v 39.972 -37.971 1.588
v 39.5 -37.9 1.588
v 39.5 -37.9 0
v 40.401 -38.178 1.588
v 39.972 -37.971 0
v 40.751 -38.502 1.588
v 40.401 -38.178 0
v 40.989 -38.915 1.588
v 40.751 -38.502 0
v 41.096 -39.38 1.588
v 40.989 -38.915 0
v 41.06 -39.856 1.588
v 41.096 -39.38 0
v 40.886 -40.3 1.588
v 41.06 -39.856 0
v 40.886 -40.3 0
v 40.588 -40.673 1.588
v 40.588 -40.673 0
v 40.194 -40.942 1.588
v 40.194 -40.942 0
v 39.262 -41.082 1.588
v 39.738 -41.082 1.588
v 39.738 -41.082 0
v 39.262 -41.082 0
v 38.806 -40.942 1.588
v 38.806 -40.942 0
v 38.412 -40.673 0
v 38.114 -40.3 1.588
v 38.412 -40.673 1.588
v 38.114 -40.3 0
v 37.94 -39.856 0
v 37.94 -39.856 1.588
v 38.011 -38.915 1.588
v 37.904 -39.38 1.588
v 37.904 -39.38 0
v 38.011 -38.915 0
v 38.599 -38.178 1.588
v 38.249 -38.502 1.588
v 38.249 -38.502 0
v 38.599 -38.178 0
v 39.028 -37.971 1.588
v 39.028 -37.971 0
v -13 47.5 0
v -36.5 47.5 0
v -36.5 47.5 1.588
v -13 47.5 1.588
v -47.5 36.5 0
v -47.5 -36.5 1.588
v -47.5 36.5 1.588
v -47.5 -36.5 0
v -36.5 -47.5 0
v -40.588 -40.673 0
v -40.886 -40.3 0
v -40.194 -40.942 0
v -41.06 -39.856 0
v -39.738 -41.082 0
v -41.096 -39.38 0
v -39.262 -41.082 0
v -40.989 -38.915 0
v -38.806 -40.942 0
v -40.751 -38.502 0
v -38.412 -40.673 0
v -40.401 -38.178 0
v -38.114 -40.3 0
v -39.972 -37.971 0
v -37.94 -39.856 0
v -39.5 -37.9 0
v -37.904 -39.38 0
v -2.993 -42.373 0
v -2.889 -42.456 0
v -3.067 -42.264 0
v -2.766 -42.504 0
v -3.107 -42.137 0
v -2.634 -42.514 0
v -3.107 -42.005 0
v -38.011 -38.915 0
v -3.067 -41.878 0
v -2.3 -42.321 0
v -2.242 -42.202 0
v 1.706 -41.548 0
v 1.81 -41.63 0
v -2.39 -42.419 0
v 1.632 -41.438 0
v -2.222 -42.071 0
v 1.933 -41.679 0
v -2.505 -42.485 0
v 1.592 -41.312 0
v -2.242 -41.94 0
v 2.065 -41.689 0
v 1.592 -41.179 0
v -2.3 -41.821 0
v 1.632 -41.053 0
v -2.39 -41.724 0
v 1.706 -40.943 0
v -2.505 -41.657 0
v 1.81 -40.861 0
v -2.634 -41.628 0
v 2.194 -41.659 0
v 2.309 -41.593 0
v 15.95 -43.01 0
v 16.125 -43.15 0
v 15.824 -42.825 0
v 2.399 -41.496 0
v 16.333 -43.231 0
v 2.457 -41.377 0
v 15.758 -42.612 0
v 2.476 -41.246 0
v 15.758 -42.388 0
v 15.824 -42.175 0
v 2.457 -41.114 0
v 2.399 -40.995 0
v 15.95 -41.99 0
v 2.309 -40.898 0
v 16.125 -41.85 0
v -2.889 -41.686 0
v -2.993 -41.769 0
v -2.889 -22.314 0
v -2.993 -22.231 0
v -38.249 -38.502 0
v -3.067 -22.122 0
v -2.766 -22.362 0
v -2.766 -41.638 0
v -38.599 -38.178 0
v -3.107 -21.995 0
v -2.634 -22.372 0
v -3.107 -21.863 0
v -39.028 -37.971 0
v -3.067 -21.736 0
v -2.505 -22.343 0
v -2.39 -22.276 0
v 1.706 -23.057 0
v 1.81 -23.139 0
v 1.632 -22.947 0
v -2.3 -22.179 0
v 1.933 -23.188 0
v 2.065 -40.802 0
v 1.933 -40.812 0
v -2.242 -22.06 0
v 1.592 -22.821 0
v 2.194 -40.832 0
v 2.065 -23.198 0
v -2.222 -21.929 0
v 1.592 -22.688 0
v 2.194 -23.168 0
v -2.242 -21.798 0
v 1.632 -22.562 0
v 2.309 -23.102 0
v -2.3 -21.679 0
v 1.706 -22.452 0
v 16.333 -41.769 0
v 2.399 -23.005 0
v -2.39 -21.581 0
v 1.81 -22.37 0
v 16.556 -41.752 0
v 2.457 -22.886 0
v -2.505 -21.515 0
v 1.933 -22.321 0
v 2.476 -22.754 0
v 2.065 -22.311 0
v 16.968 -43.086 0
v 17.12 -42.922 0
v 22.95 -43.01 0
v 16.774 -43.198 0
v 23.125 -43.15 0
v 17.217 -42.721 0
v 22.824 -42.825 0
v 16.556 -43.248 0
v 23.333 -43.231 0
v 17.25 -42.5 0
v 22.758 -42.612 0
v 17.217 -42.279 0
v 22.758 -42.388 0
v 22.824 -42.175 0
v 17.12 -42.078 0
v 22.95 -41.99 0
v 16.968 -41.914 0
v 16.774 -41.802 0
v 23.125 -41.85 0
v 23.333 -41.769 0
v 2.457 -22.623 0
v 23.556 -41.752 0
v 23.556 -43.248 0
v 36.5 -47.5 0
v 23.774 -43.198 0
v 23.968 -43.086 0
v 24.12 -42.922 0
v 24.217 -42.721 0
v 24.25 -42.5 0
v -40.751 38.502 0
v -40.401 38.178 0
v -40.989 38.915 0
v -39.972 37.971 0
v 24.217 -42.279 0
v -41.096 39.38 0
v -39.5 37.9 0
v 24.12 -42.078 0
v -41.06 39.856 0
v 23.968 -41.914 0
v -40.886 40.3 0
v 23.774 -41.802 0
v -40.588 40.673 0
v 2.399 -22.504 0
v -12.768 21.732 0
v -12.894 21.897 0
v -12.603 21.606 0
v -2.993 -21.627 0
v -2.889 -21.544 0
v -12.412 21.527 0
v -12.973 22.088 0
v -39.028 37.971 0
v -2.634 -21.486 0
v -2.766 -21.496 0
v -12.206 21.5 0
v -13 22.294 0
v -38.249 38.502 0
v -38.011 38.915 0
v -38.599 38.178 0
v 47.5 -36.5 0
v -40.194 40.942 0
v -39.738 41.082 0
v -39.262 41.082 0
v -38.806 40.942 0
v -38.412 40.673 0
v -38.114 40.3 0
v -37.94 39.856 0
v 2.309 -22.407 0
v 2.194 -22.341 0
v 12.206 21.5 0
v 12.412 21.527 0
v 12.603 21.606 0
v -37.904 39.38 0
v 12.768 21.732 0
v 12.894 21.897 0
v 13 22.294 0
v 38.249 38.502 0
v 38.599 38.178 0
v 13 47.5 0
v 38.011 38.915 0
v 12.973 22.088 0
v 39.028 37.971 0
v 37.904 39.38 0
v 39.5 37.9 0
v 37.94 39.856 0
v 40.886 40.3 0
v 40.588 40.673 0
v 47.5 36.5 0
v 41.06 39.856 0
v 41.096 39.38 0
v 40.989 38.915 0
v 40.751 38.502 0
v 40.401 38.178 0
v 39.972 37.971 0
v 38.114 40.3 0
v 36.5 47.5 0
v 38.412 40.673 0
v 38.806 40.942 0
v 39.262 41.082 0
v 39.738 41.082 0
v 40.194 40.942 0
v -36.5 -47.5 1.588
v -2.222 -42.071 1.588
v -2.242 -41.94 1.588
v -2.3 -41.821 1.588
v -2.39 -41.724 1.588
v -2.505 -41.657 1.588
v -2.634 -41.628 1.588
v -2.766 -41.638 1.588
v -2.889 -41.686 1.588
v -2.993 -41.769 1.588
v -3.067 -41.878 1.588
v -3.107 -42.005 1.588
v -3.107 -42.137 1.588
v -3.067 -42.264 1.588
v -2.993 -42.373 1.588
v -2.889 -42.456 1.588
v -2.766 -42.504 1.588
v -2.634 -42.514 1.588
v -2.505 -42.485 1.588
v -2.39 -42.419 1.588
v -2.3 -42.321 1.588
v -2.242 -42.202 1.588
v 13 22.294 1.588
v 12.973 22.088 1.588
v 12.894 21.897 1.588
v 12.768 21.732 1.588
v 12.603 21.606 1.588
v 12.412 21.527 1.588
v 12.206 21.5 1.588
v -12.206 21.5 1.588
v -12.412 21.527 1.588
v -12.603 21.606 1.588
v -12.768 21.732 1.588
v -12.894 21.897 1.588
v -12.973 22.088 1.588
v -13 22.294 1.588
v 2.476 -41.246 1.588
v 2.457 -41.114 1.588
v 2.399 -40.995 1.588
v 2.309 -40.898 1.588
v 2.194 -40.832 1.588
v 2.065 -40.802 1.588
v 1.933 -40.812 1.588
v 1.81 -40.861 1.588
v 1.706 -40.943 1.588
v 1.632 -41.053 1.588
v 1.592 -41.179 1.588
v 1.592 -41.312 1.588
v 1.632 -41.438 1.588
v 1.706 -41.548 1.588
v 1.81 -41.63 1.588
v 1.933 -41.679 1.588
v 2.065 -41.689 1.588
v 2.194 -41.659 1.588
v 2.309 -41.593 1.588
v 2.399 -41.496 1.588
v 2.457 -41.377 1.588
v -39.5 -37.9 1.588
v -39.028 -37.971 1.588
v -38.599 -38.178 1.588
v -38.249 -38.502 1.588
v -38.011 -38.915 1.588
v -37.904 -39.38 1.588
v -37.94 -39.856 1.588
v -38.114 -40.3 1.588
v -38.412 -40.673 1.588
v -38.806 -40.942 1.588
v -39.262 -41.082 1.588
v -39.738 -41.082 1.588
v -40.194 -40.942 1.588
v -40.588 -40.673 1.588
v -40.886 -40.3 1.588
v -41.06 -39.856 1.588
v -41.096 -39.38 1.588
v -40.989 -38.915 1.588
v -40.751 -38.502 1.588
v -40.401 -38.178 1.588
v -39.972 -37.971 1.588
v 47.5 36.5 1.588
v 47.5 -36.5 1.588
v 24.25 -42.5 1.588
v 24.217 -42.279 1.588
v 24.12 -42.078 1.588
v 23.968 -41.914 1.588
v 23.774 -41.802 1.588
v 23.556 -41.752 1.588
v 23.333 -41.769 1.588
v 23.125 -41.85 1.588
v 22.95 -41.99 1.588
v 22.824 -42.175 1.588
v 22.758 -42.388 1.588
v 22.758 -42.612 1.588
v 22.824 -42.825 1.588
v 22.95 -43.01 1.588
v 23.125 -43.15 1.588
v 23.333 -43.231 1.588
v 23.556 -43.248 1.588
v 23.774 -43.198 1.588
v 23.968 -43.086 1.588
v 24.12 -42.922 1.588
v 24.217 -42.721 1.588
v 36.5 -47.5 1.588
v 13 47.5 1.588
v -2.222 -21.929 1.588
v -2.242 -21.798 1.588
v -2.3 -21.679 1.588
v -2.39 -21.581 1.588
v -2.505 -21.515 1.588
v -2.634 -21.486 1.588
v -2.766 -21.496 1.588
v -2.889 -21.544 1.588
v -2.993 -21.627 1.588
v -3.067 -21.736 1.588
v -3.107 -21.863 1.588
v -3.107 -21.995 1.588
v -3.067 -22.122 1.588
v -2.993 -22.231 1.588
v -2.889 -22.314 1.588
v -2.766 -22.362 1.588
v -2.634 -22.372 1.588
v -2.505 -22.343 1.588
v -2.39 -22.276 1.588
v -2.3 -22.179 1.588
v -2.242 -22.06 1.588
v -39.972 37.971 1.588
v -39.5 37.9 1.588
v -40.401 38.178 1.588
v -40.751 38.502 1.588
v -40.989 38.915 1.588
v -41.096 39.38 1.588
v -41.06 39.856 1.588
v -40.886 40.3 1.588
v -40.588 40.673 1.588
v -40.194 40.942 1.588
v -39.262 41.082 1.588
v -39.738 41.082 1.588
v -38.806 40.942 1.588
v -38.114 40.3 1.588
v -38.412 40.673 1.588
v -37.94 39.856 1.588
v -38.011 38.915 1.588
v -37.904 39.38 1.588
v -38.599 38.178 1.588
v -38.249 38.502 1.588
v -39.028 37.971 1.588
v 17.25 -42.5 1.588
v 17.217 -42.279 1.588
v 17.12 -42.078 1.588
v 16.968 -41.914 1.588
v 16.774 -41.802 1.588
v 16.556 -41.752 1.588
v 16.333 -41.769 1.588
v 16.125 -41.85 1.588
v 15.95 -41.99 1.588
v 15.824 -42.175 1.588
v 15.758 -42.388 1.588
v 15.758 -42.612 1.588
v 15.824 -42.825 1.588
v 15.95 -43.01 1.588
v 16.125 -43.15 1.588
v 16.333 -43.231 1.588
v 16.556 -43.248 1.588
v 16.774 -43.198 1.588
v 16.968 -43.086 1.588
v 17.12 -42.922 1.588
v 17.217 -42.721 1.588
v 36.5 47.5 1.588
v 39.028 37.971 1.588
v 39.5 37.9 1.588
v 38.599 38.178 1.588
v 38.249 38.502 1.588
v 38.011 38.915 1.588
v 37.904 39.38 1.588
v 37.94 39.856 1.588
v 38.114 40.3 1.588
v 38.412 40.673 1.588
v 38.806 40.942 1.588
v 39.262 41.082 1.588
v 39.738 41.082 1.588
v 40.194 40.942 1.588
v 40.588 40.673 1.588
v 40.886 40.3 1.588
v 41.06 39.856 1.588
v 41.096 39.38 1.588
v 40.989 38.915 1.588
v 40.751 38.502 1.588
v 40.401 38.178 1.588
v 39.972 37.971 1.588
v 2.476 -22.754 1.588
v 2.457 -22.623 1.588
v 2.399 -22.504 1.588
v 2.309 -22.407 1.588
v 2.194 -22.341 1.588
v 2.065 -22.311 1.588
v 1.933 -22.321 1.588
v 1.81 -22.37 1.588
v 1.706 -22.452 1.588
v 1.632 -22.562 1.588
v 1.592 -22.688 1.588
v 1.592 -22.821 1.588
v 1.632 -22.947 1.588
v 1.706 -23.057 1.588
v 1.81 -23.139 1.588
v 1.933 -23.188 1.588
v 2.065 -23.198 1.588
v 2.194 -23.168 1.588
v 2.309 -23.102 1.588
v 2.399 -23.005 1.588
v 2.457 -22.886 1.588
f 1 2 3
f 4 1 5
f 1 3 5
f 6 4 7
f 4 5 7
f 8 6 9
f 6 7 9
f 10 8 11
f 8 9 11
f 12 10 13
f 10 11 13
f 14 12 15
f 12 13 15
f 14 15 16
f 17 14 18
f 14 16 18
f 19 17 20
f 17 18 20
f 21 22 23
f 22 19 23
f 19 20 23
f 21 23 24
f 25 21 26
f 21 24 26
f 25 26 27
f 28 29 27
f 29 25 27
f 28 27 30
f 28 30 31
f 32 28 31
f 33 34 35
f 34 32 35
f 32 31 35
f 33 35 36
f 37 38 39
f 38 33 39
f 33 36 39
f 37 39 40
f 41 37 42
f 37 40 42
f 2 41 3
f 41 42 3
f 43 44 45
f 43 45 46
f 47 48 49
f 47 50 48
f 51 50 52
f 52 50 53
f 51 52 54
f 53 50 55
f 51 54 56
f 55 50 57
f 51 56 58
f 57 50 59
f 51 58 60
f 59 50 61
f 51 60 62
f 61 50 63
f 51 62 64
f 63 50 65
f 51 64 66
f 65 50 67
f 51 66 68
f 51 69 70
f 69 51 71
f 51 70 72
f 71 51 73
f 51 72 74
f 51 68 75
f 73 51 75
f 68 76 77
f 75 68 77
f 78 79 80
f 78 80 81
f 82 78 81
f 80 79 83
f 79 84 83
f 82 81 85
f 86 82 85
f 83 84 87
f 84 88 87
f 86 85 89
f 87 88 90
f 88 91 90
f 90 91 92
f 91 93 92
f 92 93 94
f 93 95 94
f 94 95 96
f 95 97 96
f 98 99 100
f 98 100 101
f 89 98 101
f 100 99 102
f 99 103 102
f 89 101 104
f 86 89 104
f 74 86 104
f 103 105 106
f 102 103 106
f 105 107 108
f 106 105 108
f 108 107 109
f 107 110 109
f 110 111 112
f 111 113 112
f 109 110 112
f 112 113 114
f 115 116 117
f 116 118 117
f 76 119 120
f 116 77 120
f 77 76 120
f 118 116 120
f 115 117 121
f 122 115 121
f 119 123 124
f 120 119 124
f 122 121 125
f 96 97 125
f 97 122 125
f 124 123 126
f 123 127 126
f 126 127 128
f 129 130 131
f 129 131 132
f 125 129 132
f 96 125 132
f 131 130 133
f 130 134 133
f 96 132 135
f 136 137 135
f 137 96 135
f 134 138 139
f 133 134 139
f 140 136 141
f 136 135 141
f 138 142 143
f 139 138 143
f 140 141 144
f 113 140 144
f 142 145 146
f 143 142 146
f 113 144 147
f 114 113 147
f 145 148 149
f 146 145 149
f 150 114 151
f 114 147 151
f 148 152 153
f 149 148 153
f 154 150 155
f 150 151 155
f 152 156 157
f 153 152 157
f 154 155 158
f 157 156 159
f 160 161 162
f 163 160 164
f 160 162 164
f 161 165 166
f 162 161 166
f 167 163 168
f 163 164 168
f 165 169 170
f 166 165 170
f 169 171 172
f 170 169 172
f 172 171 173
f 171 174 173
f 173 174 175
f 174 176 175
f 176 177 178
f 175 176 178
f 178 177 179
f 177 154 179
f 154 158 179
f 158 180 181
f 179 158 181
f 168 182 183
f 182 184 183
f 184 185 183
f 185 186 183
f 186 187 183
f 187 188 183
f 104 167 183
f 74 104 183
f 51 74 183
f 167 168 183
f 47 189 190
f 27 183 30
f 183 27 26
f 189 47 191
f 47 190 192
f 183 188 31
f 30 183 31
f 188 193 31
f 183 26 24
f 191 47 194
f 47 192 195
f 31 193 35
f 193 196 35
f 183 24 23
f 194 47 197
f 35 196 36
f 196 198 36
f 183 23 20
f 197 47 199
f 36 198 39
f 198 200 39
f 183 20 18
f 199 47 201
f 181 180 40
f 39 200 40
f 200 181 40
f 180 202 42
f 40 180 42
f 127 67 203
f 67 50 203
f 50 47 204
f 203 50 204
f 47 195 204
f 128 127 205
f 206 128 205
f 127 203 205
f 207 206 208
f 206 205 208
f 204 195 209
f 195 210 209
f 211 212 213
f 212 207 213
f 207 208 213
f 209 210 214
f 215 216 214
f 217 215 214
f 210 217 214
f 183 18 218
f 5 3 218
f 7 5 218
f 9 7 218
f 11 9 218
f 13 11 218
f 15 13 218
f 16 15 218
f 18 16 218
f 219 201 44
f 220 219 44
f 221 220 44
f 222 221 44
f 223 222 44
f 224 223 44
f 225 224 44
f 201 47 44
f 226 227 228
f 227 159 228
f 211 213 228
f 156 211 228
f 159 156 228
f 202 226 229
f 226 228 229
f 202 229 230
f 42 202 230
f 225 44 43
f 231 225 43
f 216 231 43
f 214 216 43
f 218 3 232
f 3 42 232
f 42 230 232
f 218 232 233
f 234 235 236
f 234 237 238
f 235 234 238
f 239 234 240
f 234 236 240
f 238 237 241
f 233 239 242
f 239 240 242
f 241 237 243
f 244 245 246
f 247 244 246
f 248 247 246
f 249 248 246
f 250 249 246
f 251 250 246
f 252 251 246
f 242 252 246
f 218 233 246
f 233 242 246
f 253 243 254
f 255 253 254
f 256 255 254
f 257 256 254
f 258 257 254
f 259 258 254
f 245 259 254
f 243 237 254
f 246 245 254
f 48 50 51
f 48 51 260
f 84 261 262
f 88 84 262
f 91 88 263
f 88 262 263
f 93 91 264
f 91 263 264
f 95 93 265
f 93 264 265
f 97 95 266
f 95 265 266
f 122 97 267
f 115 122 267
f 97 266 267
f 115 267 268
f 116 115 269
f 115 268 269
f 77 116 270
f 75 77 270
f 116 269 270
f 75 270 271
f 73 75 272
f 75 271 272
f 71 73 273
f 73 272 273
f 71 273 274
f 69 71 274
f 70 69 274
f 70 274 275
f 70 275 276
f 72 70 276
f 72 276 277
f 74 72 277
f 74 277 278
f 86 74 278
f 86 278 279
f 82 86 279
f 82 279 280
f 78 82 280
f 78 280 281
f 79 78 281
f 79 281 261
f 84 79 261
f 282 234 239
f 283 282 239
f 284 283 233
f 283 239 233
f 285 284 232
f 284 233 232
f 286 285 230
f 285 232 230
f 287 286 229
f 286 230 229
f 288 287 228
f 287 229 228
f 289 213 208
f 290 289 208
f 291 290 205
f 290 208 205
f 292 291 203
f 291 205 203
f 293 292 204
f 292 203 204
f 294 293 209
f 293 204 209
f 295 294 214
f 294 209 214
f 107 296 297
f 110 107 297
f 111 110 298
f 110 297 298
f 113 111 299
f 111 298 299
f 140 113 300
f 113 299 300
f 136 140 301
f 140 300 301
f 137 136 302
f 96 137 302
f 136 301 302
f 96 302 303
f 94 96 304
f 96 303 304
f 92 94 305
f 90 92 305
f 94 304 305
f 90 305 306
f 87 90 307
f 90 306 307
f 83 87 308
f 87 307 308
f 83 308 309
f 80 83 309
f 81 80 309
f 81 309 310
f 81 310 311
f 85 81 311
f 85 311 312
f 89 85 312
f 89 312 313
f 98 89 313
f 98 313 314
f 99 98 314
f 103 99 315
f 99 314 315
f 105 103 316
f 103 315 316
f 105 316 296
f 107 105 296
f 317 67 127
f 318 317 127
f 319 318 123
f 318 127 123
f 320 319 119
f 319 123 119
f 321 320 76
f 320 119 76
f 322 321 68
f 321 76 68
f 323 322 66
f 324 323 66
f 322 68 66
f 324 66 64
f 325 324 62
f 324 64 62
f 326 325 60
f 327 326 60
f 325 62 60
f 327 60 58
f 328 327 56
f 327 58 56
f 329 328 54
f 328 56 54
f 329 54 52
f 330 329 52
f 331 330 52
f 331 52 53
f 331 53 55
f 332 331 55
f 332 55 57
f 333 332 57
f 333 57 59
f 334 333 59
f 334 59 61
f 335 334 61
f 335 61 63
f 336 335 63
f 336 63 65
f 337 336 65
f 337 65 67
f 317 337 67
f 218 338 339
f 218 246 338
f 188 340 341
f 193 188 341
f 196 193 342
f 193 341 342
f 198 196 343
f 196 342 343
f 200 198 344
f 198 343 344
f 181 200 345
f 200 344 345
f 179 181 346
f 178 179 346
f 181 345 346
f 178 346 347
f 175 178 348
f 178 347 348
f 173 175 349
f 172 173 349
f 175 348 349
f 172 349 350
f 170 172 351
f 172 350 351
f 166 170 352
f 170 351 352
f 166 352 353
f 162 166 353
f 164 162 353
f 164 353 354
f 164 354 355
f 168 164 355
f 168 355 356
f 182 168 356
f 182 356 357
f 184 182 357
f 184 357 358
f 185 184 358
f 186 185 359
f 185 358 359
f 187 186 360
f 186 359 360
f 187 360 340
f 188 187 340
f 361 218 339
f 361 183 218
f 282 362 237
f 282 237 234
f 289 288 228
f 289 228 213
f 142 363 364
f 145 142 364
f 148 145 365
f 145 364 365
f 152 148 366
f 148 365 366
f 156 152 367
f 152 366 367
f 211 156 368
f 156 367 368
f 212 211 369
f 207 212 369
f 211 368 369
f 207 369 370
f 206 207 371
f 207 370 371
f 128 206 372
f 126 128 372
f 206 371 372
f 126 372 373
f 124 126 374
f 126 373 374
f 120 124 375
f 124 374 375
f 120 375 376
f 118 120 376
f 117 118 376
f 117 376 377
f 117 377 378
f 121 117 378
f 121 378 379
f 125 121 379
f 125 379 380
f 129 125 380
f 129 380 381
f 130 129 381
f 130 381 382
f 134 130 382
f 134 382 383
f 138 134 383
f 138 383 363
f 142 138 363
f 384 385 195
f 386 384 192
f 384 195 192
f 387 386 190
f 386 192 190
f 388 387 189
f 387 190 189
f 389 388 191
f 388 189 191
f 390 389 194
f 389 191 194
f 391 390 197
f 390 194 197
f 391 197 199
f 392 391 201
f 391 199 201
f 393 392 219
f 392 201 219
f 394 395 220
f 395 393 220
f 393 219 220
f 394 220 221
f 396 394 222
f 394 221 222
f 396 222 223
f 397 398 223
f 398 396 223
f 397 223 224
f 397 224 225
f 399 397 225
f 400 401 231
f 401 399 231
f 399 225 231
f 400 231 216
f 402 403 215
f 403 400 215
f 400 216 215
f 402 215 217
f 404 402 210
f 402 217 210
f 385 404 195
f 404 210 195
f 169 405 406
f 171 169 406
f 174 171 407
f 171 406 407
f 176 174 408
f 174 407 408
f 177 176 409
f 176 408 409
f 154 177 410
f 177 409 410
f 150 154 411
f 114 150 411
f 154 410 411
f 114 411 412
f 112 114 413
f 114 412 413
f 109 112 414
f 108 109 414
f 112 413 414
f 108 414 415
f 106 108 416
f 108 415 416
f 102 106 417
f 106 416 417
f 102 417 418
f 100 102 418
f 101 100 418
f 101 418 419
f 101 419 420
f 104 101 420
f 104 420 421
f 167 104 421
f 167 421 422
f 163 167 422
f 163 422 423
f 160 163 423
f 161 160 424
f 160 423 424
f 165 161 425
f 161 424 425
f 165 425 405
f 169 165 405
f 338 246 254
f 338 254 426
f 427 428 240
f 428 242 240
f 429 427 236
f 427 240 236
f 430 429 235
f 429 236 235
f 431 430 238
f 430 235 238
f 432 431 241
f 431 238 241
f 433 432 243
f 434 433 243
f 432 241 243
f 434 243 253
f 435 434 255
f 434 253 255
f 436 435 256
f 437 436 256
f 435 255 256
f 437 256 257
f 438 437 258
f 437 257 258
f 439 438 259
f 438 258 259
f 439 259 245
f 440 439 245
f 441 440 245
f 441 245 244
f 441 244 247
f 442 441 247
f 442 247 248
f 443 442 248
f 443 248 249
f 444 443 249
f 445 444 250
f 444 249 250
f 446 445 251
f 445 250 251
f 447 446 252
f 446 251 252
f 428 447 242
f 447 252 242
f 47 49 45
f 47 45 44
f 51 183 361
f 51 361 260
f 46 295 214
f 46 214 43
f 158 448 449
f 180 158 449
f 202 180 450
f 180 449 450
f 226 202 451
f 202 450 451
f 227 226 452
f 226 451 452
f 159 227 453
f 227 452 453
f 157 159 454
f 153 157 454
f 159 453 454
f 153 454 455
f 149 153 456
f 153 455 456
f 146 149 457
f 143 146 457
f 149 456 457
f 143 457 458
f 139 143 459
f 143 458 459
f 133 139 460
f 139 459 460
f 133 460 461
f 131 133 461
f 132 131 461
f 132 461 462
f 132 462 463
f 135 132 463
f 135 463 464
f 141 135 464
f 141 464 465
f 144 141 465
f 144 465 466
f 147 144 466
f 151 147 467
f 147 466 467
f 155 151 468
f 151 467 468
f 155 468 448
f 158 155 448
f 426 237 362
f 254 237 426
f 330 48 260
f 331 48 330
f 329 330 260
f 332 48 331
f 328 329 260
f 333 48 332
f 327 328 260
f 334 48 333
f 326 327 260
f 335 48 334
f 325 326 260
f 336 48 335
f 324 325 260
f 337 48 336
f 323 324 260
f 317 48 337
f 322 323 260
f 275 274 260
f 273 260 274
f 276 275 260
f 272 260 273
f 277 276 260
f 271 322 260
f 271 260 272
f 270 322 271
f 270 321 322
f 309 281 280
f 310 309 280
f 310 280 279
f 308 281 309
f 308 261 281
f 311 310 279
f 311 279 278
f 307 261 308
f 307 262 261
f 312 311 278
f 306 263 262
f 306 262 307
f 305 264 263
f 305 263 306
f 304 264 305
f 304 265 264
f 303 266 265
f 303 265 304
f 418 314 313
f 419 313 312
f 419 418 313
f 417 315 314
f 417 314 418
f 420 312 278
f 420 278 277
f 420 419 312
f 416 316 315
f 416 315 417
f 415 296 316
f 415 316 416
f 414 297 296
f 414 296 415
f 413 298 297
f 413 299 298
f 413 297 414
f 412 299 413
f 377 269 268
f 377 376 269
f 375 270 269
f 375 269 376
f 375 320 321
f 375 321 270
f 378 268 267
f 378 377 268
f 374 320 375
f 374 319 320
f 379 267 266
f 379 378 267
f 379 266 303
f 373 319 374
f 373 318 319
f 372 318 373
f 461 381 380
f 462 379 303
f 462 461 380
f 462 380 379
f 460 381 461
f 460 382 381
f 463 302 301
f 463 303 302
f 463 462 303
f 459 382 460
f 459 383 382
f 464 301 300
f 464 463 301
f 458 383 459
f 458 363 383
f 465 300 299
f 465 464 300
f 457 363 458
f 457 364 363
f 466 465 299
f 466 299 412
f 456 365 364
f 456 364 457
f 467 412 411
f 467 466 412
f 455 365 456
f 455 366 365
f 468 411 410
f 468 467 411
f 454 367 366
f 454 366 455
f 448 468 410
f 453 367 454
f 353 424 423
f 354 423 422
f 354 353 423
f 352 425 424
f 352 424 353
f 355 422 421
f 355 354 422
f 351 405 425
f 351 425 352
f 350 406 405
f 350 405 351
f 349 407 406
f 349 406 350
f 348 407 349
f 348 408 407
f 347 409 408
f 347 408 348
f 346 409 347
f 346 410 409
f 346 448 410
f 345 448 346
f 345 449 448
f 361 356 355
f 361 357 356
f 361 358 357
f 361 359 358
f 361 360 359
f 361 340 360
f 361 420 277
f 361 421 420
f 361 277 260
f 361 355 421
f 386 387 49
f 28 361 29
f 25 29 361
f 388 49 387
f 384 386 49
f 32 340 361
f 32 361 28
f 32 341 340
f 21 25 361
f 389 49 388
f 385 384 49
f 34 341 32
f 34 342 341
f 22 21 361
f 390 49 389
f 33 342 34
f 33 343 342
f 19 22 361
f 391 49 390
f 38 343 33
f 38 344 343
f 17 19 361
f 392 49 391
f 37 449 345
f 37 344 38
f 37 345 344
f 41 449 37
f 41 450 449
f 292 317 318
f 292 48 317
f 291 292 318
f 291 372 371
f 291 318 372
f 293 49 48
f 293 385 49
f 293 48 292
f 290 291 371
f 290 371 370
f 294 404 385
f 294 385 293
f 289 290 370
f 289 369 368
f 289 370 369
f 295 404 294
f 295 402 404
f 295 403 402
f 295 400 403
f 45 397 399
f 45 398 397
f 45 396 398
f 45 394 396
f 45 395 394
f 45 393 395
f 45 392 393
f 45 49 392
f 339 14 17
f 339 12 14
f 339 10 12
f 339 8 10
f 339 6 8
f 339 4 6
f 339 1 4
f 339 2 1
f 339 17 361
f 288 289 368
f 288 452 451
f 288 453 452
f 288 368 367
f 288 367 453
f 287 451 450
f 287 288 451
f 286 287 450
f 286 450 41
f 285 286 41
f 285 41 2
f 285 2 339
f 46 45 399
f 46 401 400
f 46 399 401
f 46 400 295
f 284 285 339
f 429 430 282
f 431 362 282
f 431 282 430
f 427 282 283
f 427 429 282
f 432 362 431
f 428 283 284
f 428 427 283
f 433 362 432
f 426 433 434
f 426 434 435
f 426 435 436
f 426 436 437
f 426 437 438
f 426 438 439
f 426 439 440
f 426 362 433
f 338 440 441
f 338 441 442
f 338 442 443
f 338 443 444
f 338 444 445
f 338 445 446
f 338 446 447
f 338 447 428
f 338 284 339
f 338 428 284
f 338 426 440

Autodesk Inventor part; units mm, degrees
sketch "AL_spacer_contact_Zminus" plane through (0, 0, 0) normal (0, 0, 1) x (1, 0, 0)
  circle A0 centre (39.5, 39.5) radius 3.175
  circle A1 centre (39.5, -39.5) radius 3.175
  circle A2 centre (-39.5, -39.5) radius 3.175
  circle A3 centre (-39.5, 39.5) radius 3.175
  point P0 (0, 0)
  dimension "d228" = 39.5
  dimension "d229" = 39.5
  dimension "d230" = 39.5
  dimension "d231" = 39.5
  dimension "d232" = 39.5
  dimension "d233" = 39.5
  dimension "d234" = 39.5
  dimension "d235" = 39.5
  dimension "d236" = 6.35
sketch "Delrin_stayout_Zminus" plane through (0, 0, 0) normal (0, 0, 1) x (1, 0, 0)
  line L0 (47.5, 39.5) -> (47.5, 31)
  line L1 (47.5, 31) -> (39.5, 31)
  line L2 (39.5, 31) -> (31, 39.5)
  line L3 (31, 39.5) -> (31, 47.5)
  line L4 (31, 47.5) -> (39.5, 47.5)
  line L5 (39.5, 47.5) -> (47.5, 39.5)
  line L6 (-39.5, 47.5) -> (-47.5, 39.5)
  line L7 (-47.5, 39.5) -> (-47.5, 31)
  line L8 (-47.5, 31) -> (-39.5, 31)
  line L9 (-39.5, 31) -> (-31, 39.5)
  line L10 (-31, 39.5) -> (-31, 47.5)
  line L11 (-31, 47.5) -> (-39.5, 47.5)
  line L12 (47.5, -39.5) -> (39.5, -47.5)
  line L13 (39.5, -47.5) -> (31, -47.5)
  line L14 (31, -47.5) -> (31, -39.5)
  line L15 (31, -39.5) -> (39.5, -31)
  line L16 (39.5, -31) -> (47.5, -31)
  line L17 (47.5, -31) -> (47.5, -39.5)
  line L18 (-39.5, -47.5) -> (-47.5, -39.5)
  line L19 (-47.5, -39.5) -> (-47.5, -31)
  line L20 (-47.5, -31) -> (-39.5, -31)
  line L21 (-39.5, -31) -> (-31, -39.5)
  line L22 (-31, -39.5) -> (-31, -47.5)
  line L23 (-31, -47.5) -> (-39.5, -47.5)
  point P0 (0, 0)
  dimension "d243" = 16.5
  dimension "d244" = 8
  dimension "d245" = 8.5
  dimension "d246" = 16.5
  dimension "d247" = 47.5
  dimension "d248" = 47.5
  dimension "d249" = 47.5
  dimension "d250" = 47.5
  dimension "d251" = 47.5
  dimension "d252" = 47.5
  dimension "d253" = 47.5
  dimension "d254" = 47.5
sketch "Nub_stayout_Zminus" plane through (0, 0, 0) normal (0, 0, 1) x (1, 0, 0)
  line L0 (29, 47.5) -> (39.5, 47.5)
  line L1 (39.5, 47.5) -> (47.5, 39.5)
  line L2 (47.5, 39.5) -> (47.5, 29)
  line L3 (47.5, 29) -> (42, 29)
  line L4 (42, 29) -> (42, 40.4125)
  line L5 (40.4125, 42) -> (29, 42)
  line L6 (29, 42) -> (29, 47.5)
  arc A0 (42, 40.4125) -> (40.4125, 42) centre (40.4125, 40.4125) ccw
  line L7 (-29, 47.5) -> (-39.5, 47.5)
  line L8 (-39.5, 47.5) -> (-47.5, 39.5)
  line L9 (-47.5, 39.5) -> (-47.5, 29)
  line L10 (-47.5, 29) -> (-42, 29)
  line L11 (-42, 29) -> (-42, 40.4125)
  line L12 (-40.4125, 42) -> (-29, 42)
  line L13 (-29, 42) -> (-29, 47.5)
  arc A1 (-40.4125, 42) -> (-42, 40.4125) centre (-40.4125, 40.4125) ccw
  line L14 (-47.5, -29) -> (-42, -29)
  line L15 (-42, -29) -> (-42, -40.4125)
  line L16 (-40.4125, -42) -> (-29, -42)
  line L17 (-29, -42) -> (-29, -47.5)
  line L18 (-29, -47.5) -> (-39.5, -47.5)
  line L19 (-39.5, -47.5) -> (-47.5, -39.5)
  line L20 (-47.5, -39.5) -> (-47.5, -29)
  arc A2 (-42, -40.4125) -> (-40.4125, -42) centre (-40.4125, -40.4125) ccw
  line L21 (47.5, -29) -> (42, -29)
  line L22 (42, -29) -> (42, -40.4125)
  line L23 (40.4125, -42) -> (29, -42)
  line L24 (29, -42) -> (29, -47.5)
  line L25 (29, -47.5) -> (39.5, -47.5)
  line L26 (39.5, -47.5) -> (47.5, -39.5)
  line L27 (47.5, -39.5) -> (47.5, -29)
  arc A3 (40.4125, -42) -> (42, -40.4125) centre (40.4125, -40.4125) ccw
  point P0 (0, 0)
  dimension "d255" = 1.5875
  dimension "d256" = 18.5
  dimension "d257" = 8
  dimension "d258" = 5.5
  dimension "d259" = 47.5
  dimension "d260" = 47.5
  dimension "d264" = 1.5875
  dimension "d265" = 47.5
  dimension "d266" = 47.5
  dimension "d267" = 1.5875
  dimension "d268" = 47.5
  dimension "d269" = 47.5
  dimension "d270" = 1.5875
  dimension "d271" = 47.5
  dimension "d272" = 47.5
ref_plane "Zplus_face" through (0, 0, 1.5875) normal (0, 0, 1) x (1, 0, 0)
sketch "AL_spacer_contact_Zplus" plane through (0, 0, 1.5875) normal (0, 0, 1) x (1, 0, 0)
  circle A0 centre (-39.5, 39.5) radius 3.175
  circle A1 centre (-39.5, -39.5) radius 3.175
  circle A2 centre (39.5, -39.5) radius 3.175
  circle A3 centre (39.5, 39.5) radius 3.175
  point P0 (0, 0)
  dimension "d129" = 39.5
  dimension "d130" = 39.5
  dimension "d131" = 39.5
  dimension "d132" = 39.5
  dimension "d133" = 6.35
sketch "Delrin_stayout_Zplus" plane through (0, 0, 1.5875) normal (0, 0, 1) x (1, 0, 0)
  line L0 (47.5, -31) -> (47.5, -39.5)
  line L1 (47.5, -39.5) -> (39.5, -47.5)
  line L2 (39.5, -47.5) -> (31, -47.5)
  line L3 (31, -47.5) -> (31, -39.5)
  line L4 (31, -39.5) -> (39.5, -31)
  line L5 (39.5, -31) -> (47.5, -31)
  line L6 (47.5, 31) -> (47.5, 39.5)
  line L7 (47.5, 39.5) -> (39.5, 47.5)
  line L8 (39.5, 47.5) -> (31, 47.5)
  line L9 (31, 47.5) -> (31, 39.5)
  line L10 (31, 39.5) -> (39.5, 31)
  line L11 (39.5, 31) -> (47.5, 31)
  line L12 (-39.5, 47.5) -> (-47.5, 39.5)
  line L13 (-47.5, 39.5) -> (-47.5, 31)
  line L14 (-47.5, 31) -> (-39.5, 31)
  line L15 (-39.5, 31) -> (-31, 39.5)
  line L16 (-31, 39.5) -> (-31, 47.5)
  line L17 (-31, 47.5) -> (-39.5, 47.5)
  line L18 (-47.5, -39.5) -> (-39.5, -47.5)
  line L19 (-39.5, -47.5) -> (-31, -47.5)
  line L20 (-31, -47.5) -> (-31, -39.5)
  line L21 (-31, -39.5) -> (-39.5, -31)
  line L22 (-39.5, -31) -> (-47.5, -31)
  line L23 (-47.5, -31) -> (-47.5, -39.5)
  point P0 (0, 0)
  dimension "d115" = 16.5
  dimension "d116" = 16.5
  dimension "d117" = 8
  dimension "d118" = 8.5
  dimension "d121" = 47.5
  dimension "d122" = 47.5
  dimension "d123" = 47.5
  dimension "d124" = 47.5
  dimension "d125" = 47.5
  dimension "d126" = 47.5
  dimension "d127" = 47.5
  dimension "d128" = 47.5
sketch "Nub_stayout_Zplus" plane through (0, 0, 1.5875) normal (0, 0, 1) x (1, 0, 0)
  line L0 (47.5, 29) -> (42, 29)
  line L1 (42, 29) -> (42, 40.4125)
  line L2 (40.4125, 42) -> (29, 42)
  line L3 (29, 42) -> (29, 47.5)
  arc A0 (42, 40.4125) -> (40.4125, 42) centre (40.4125, 40.4125) ccw
  line L4 (29, 47.5) -> (39.5, 47.5)
  line L5 (39.5, 47.5) -> (47.5, 39.5)
  line L6 (47.5, 39.5) -> (47.5, 29)
  line L7 (-39.5, 47.5) -> (-29, 47.5)
  line L8 (-29, 47.5) -> (-29, 42)
  line L9 (-29, 42) -> (-40.4125, 42)
  line L10 (-42, 40.4125) -> (-42, 29)
  line L11 (-42, 29) -> (-47.5, 29)
  line L12 (-47.5, 29) -> (-47.5, 39.5)
  line L13 (-47.5, 39.5) -> (-39.5, 47.5)
  arc A1 (-40.4125, 42) -> (-42, 40.4125) centre (-40.4125, 40.4125) ccw
  line L14 (-47.5, -29) -> (-47.5, -39.5)
  line L15 (-47.5, -39.5) -> (-39.5, -47.5)
  line L16 (-39.5, -47.5) -> (-29, -47.5)
  line L17 (-29, -47.5) -> (-29, -42)
  line L18 (-29, -42) -> (-40.4125, -42)
  line L19 (-42, -40.4125) -> (-42, -29)
  line L20 (-42, -29) -> (-47.5, -29)
  arc A2 (-42, -40.4125) -> (-40.4125, -42) centre (-40.4125, -40.4125) ccw
  line L21 (29, -47.5) -> (39.5, -47.5)
  line L22 (39.5, -47.5) -> (47.5, -39.5)
  line L23 (47.5, -39.5) -> (47.5, -29)
  line L24 (47.5, -29) -> (42, -29)
  line L25 (42, -29) -> (42, -40.4125)
  line L26 (40.4125, -42) -> (29, -42)
  line L27 (29, -42) -> (29, -47.5)
  arc A3 (40.4125, -42) -> (42, -40.4125) centre (40.4125, -40.4125) ccw
  point P0 (0, 0)
  dimension "d146" = 1.5875
  dimension "d147" = 5.5
  dimension "d149" = 18.5
  dimension "d150" = 8
  dimension "d151" = 47.5
  dimension "d152" = 47.5
  dimension "d153" = 1.5875
  dimension "d154" = 47.5
  dimension "d155" = 47.5
  dimension "d156" = 1.5875
  dimension "d157" = 47.5
  dimension "d158" = 47.5
  dimension "d159" = 1.5875
  dimension "d160" = 47.5
  dimension "d161" = 47.5
sketch "Sketch1" plane through (0, 0, 0) normal (0, 0, 1) x (1, 0, 0)
  line L0 (-47.5, 47.5) -> (47.5, 47.5)
  line L1 (47.5, 47.5) -> (47.5, -47.5)
  line L2 (47.5, -47.5) -> (-47.5, -47.5)
  line L3 (-47.5, -47.5) -> (-47.5, 47.5)
  point P0 (0, 0)
  dimension "d0" = 95
  dimension "d1" = 95
  dimension "d2" = 47.5
  dimension "d3" = 47.5
extrude "Extrusion1" add sketch "Sketch1" along normal blind 1.5875
chamfer "Chamfer2" distance 11 angle 45 4 edges at (-47.5, -47.5, 0.7937) (47.5, -47.5, 0.7937) (47.5, 47.5, 0.7937) (-47.5, 47.5, 0.7937)
ref_plane "Work Plane_ConnX" through (-32, 0, 0) normal (1, 0, 0) x (0, 1, 0)
ref_plane "Work Plane_ConnY" through (0, 0, 0) normal (0, 1, 0) x (-1, 0, 0)
sketch "Sketch9" plane through (0, 0, 1.5875) normal (0, 0, 1) x (1, 0, 0)
  line L0 (47.5, 47.5) -> (47.5, -47.5) projected
  line L1 (58.5598, -32) -> (-58.5598, -32)
  circle A0 centre (-2.667, -21.9289) radius 0.4445
  circle A1 centre (-2.667, -42.0711) radius 0.4445
  line L2 (0, 26.5598) -> (0, -90.5598) construction
  point P0 (0, 0)
  point P1 (0, -32)
  dimension "d134" = 20.1422
  dimension "d136" = 2.667
  dimension "d138" = 0.889
  dimension "d141" = 180
  dimension "d350" = 32
  dimension "d351" = 0
extrude "Holes_Conn_Zminus" cut sketch "Sketch9" against normal through all
sketch "Sketch22" plane through (0, 0, 1.5875) normal (0, 0, 1) x (1, 0, 0)
  line L0 (47.5, 36.5) -> (47.5, -36.5) projected
  line L1 (0, -1.0026) -> (0, -62.9974) construction
  line L2 (62.8115, -32) -> (-62.8115, -32)
  circle A0 centre (2.032, -22.7545) radius 0.4445
  circle A1 centre (2.032, -41.2455) radius 0.4445
  point P0 (0, 0)
  point P1 (0, -32)
  dimension "d282" = 180
  dimension "d283" = 18.491
  dimension "d284" = 0.889
  dimension "d285" = 2.032
  dimension "d352" = 32
  dimension "d353" = 0
extrude "Holes_Conn_Zplus" cut sketch "Sketch22" against normal through all
hole "Hole5" at (39.5, 39.5, 1.5875) direction (0, 0, -1) diameter 3.2 end through all
mirror "Mirror5" about plane through (0, 0, 0) normal (1, 0, 0) of "Hole5"
mirror "Mirror6" about plane through (0, 0, 0) normal (0, 1, 0) of "Hole5", "Mirror5"
sketch "Sketch25" plane through (0, 0, 1.5875) normal (0, 0, 1) x (1, 0, 0)
  circle A0 centre (-39.5, -39.5) radius 1.6 projected
  circle A1 centre (39.5, -39.5) radius 1.6 projected
  circle A2 centre (-39.5, 39.5) radius 1.6 projected
  circle A3 centre (39.5, 39.5) radius 1.6 projected
  line L0 (36.5, -47.5) -> (-36.5, -47.5) projected
  line L1 (0, 0) -> (0, -59.2198)
  line L2 (8, -47.5) -> (8, -15.5)
  line L3 (8, -15.5) -> (-8, -15.5)
  line L4 (-8, -15.5) -> (-8, -47.5)
  line L5 (-8, -47.5) -> (-62.7516, -61.7336)
  line L6 (-62.7516, -61.7336) -> (-64.2933, 68.2222)
  line L7 (-64.2933, 68.2222) -> (58.3572, 62.5728)
  line L8 (58.3572, 62.5728) -> (56.5848, -69.017)
  line L9 (56.5848, -69.017) -> (8, -47.5)
  dimension "d362" = 16
  dimension "d363" = 32
extrude "Extrusion9" [suppressed]
sketch "Sketch26" plane through (0, 0, 1.5875) normal (0, 0, 1) x (1, 0, 0)
  line L0 (36.5, -47.5) -> (-36.5, -47.5) projected
  circle A0 centre (16.5, -42.5) radius 0.75
  circle A1 centre (23.5, -42.5) radius 0.75
  line L1 (20, -36.5) -> (20, -45.9188)
  point P0 (0, 0)
  point P1 (20, -42.5)
  dimension "d366" = 1.5
  dimension "d367" = 7
  dimension "d368" = 5
  dimension "d369" = 20
extrude "Extrusion10" cut sketch "Sketch26" against normal through all
sketch "Sketch28" plane through (0, 0, 1.5875) normal (0, 0, 1) x (1, 0, 0)
  line L0 (-36.5, 47.5) -> (36.5, 47.5) projected
  line L1 (0, 0) -> (0, 18.8917)
  line L2 (-13, 47.5) -> (13, 47.5)
  line L3 (13, 47.5) -> (13, 21.5)
  line L4 (13, 21.5) -> (-13, 21.5)
  line L5 (-13, 21.5) -> (-13, 47.5)
  dimension "d372" = 26
  dimension "d373" = 26
extrude "Extrusion11" cut sketch "Sketch28" against normal through all
fillet "Fillet3" radius 0.7937 2 edges at (-13, 21.5, 0.7937) (13, 21.5, 0.7937)
sketch "Sketch29" plane through (0, 0, 1.5875) normal (0, 0, 1) x (1, 0, 0)
  line L0 (36.5, -47.5) -> (-36.5, -47.5) projected
  circle A0 centre (-27.5, -43) radius 1.39
  circle A1 centre (27.5, -43) radius 1.39
  arc A2 (-26.11, -47.5) -> (-28.89, -47.5) centre (-27.5, -47.5) ccw
  arc A3 (28.89, -47.5) -> (26.11, -47.5) centre (27.5, -47.5) ccw
  line L1 (0, 0) -> (0, -8.2455)
  dimension "d377" = 2.78
  dimension "d379" = 4.5
  dimension "d380" = 55
extrude "Extrusion12" [suppressed]
sketch "Sketch30" plane through (0, 0, 1.5875) normal (0, 0, 1) x (1, 0, 0)
  line L0 (-47.5, -36.5) -> (-47.5, 36.5) projected
  circle A0 centre (-27.5, -43) radius 1.39 projected
  circle A1 centre (-47.5, 27.5) radius 1.39
  circle A2 centre (-47.5, -27.5) radius 1.39
  circle A3 centre (-43, -27.5) radius 1.39
  circle A4 centre (-43, 27.5) radius 1.39
  line L1 (0, 0) -> (-6.8618, 0)
  dimension "d383" = 4.5
  dimension "d384" = 55
extrude "Extrusion13" [suppressed]
sketch "Sketch31" plane through (0, 0, 1.5875) normal (0, 0, 1) x (1, 0, 0)
  line L0 (-47.5, -36.5) -> (-47.5, 36.5) projected
  line L1 (36.5, -47.5) -> (-36.5, -47.5) projected
  line L2 (47.5, 36.5) -> (47.5, -36.5) projected
  line L3 (13, 47.5) -> (36.5, 47.5) projected
  line L4 (-47.545, 47.455) -> (47.5, 47.5) construction
  line L5 (47.5, 47.5) -> (47.545, -47.455) construction
  line L6 (47.545, -47.455) -> (-47.5, -47.5) construction
  line L7 (-47.5, -47.5) -> (-47.545, 47.455) construction
  point P0 (0, 0)
decal "Decal1"
sketch "Sketch32" plane through (0, 0, 0) normal (0, 0, -1) x (-1, 0, 0)
  line L0 (-47.5, 36.5) -> (-47.5, -36.5) projected
  line L1 (-36.5, -47.5) -> (36.5, -47.5) projected
  line L2 (47.5, -36.5) -> (47.5, 36.5) projected
  line L3 (36.5, 47.5) -> (13, 47.5) projected
  line L4 (-47.545, 47.455) -> (47.5, 47.5) construction
  line L5 (47.5, 47.5) -> (47.545, -47.455) construction
  line L6 (47.545, -47.455) -> (-47.5, -47.5) construction
  line L7 (-47.5, -47.5) -> (-47.545, 47.455) construction
  point P0 (0, 0)
decal "Decal2"
properties part number "PCB_Batt1" material "FR4"
